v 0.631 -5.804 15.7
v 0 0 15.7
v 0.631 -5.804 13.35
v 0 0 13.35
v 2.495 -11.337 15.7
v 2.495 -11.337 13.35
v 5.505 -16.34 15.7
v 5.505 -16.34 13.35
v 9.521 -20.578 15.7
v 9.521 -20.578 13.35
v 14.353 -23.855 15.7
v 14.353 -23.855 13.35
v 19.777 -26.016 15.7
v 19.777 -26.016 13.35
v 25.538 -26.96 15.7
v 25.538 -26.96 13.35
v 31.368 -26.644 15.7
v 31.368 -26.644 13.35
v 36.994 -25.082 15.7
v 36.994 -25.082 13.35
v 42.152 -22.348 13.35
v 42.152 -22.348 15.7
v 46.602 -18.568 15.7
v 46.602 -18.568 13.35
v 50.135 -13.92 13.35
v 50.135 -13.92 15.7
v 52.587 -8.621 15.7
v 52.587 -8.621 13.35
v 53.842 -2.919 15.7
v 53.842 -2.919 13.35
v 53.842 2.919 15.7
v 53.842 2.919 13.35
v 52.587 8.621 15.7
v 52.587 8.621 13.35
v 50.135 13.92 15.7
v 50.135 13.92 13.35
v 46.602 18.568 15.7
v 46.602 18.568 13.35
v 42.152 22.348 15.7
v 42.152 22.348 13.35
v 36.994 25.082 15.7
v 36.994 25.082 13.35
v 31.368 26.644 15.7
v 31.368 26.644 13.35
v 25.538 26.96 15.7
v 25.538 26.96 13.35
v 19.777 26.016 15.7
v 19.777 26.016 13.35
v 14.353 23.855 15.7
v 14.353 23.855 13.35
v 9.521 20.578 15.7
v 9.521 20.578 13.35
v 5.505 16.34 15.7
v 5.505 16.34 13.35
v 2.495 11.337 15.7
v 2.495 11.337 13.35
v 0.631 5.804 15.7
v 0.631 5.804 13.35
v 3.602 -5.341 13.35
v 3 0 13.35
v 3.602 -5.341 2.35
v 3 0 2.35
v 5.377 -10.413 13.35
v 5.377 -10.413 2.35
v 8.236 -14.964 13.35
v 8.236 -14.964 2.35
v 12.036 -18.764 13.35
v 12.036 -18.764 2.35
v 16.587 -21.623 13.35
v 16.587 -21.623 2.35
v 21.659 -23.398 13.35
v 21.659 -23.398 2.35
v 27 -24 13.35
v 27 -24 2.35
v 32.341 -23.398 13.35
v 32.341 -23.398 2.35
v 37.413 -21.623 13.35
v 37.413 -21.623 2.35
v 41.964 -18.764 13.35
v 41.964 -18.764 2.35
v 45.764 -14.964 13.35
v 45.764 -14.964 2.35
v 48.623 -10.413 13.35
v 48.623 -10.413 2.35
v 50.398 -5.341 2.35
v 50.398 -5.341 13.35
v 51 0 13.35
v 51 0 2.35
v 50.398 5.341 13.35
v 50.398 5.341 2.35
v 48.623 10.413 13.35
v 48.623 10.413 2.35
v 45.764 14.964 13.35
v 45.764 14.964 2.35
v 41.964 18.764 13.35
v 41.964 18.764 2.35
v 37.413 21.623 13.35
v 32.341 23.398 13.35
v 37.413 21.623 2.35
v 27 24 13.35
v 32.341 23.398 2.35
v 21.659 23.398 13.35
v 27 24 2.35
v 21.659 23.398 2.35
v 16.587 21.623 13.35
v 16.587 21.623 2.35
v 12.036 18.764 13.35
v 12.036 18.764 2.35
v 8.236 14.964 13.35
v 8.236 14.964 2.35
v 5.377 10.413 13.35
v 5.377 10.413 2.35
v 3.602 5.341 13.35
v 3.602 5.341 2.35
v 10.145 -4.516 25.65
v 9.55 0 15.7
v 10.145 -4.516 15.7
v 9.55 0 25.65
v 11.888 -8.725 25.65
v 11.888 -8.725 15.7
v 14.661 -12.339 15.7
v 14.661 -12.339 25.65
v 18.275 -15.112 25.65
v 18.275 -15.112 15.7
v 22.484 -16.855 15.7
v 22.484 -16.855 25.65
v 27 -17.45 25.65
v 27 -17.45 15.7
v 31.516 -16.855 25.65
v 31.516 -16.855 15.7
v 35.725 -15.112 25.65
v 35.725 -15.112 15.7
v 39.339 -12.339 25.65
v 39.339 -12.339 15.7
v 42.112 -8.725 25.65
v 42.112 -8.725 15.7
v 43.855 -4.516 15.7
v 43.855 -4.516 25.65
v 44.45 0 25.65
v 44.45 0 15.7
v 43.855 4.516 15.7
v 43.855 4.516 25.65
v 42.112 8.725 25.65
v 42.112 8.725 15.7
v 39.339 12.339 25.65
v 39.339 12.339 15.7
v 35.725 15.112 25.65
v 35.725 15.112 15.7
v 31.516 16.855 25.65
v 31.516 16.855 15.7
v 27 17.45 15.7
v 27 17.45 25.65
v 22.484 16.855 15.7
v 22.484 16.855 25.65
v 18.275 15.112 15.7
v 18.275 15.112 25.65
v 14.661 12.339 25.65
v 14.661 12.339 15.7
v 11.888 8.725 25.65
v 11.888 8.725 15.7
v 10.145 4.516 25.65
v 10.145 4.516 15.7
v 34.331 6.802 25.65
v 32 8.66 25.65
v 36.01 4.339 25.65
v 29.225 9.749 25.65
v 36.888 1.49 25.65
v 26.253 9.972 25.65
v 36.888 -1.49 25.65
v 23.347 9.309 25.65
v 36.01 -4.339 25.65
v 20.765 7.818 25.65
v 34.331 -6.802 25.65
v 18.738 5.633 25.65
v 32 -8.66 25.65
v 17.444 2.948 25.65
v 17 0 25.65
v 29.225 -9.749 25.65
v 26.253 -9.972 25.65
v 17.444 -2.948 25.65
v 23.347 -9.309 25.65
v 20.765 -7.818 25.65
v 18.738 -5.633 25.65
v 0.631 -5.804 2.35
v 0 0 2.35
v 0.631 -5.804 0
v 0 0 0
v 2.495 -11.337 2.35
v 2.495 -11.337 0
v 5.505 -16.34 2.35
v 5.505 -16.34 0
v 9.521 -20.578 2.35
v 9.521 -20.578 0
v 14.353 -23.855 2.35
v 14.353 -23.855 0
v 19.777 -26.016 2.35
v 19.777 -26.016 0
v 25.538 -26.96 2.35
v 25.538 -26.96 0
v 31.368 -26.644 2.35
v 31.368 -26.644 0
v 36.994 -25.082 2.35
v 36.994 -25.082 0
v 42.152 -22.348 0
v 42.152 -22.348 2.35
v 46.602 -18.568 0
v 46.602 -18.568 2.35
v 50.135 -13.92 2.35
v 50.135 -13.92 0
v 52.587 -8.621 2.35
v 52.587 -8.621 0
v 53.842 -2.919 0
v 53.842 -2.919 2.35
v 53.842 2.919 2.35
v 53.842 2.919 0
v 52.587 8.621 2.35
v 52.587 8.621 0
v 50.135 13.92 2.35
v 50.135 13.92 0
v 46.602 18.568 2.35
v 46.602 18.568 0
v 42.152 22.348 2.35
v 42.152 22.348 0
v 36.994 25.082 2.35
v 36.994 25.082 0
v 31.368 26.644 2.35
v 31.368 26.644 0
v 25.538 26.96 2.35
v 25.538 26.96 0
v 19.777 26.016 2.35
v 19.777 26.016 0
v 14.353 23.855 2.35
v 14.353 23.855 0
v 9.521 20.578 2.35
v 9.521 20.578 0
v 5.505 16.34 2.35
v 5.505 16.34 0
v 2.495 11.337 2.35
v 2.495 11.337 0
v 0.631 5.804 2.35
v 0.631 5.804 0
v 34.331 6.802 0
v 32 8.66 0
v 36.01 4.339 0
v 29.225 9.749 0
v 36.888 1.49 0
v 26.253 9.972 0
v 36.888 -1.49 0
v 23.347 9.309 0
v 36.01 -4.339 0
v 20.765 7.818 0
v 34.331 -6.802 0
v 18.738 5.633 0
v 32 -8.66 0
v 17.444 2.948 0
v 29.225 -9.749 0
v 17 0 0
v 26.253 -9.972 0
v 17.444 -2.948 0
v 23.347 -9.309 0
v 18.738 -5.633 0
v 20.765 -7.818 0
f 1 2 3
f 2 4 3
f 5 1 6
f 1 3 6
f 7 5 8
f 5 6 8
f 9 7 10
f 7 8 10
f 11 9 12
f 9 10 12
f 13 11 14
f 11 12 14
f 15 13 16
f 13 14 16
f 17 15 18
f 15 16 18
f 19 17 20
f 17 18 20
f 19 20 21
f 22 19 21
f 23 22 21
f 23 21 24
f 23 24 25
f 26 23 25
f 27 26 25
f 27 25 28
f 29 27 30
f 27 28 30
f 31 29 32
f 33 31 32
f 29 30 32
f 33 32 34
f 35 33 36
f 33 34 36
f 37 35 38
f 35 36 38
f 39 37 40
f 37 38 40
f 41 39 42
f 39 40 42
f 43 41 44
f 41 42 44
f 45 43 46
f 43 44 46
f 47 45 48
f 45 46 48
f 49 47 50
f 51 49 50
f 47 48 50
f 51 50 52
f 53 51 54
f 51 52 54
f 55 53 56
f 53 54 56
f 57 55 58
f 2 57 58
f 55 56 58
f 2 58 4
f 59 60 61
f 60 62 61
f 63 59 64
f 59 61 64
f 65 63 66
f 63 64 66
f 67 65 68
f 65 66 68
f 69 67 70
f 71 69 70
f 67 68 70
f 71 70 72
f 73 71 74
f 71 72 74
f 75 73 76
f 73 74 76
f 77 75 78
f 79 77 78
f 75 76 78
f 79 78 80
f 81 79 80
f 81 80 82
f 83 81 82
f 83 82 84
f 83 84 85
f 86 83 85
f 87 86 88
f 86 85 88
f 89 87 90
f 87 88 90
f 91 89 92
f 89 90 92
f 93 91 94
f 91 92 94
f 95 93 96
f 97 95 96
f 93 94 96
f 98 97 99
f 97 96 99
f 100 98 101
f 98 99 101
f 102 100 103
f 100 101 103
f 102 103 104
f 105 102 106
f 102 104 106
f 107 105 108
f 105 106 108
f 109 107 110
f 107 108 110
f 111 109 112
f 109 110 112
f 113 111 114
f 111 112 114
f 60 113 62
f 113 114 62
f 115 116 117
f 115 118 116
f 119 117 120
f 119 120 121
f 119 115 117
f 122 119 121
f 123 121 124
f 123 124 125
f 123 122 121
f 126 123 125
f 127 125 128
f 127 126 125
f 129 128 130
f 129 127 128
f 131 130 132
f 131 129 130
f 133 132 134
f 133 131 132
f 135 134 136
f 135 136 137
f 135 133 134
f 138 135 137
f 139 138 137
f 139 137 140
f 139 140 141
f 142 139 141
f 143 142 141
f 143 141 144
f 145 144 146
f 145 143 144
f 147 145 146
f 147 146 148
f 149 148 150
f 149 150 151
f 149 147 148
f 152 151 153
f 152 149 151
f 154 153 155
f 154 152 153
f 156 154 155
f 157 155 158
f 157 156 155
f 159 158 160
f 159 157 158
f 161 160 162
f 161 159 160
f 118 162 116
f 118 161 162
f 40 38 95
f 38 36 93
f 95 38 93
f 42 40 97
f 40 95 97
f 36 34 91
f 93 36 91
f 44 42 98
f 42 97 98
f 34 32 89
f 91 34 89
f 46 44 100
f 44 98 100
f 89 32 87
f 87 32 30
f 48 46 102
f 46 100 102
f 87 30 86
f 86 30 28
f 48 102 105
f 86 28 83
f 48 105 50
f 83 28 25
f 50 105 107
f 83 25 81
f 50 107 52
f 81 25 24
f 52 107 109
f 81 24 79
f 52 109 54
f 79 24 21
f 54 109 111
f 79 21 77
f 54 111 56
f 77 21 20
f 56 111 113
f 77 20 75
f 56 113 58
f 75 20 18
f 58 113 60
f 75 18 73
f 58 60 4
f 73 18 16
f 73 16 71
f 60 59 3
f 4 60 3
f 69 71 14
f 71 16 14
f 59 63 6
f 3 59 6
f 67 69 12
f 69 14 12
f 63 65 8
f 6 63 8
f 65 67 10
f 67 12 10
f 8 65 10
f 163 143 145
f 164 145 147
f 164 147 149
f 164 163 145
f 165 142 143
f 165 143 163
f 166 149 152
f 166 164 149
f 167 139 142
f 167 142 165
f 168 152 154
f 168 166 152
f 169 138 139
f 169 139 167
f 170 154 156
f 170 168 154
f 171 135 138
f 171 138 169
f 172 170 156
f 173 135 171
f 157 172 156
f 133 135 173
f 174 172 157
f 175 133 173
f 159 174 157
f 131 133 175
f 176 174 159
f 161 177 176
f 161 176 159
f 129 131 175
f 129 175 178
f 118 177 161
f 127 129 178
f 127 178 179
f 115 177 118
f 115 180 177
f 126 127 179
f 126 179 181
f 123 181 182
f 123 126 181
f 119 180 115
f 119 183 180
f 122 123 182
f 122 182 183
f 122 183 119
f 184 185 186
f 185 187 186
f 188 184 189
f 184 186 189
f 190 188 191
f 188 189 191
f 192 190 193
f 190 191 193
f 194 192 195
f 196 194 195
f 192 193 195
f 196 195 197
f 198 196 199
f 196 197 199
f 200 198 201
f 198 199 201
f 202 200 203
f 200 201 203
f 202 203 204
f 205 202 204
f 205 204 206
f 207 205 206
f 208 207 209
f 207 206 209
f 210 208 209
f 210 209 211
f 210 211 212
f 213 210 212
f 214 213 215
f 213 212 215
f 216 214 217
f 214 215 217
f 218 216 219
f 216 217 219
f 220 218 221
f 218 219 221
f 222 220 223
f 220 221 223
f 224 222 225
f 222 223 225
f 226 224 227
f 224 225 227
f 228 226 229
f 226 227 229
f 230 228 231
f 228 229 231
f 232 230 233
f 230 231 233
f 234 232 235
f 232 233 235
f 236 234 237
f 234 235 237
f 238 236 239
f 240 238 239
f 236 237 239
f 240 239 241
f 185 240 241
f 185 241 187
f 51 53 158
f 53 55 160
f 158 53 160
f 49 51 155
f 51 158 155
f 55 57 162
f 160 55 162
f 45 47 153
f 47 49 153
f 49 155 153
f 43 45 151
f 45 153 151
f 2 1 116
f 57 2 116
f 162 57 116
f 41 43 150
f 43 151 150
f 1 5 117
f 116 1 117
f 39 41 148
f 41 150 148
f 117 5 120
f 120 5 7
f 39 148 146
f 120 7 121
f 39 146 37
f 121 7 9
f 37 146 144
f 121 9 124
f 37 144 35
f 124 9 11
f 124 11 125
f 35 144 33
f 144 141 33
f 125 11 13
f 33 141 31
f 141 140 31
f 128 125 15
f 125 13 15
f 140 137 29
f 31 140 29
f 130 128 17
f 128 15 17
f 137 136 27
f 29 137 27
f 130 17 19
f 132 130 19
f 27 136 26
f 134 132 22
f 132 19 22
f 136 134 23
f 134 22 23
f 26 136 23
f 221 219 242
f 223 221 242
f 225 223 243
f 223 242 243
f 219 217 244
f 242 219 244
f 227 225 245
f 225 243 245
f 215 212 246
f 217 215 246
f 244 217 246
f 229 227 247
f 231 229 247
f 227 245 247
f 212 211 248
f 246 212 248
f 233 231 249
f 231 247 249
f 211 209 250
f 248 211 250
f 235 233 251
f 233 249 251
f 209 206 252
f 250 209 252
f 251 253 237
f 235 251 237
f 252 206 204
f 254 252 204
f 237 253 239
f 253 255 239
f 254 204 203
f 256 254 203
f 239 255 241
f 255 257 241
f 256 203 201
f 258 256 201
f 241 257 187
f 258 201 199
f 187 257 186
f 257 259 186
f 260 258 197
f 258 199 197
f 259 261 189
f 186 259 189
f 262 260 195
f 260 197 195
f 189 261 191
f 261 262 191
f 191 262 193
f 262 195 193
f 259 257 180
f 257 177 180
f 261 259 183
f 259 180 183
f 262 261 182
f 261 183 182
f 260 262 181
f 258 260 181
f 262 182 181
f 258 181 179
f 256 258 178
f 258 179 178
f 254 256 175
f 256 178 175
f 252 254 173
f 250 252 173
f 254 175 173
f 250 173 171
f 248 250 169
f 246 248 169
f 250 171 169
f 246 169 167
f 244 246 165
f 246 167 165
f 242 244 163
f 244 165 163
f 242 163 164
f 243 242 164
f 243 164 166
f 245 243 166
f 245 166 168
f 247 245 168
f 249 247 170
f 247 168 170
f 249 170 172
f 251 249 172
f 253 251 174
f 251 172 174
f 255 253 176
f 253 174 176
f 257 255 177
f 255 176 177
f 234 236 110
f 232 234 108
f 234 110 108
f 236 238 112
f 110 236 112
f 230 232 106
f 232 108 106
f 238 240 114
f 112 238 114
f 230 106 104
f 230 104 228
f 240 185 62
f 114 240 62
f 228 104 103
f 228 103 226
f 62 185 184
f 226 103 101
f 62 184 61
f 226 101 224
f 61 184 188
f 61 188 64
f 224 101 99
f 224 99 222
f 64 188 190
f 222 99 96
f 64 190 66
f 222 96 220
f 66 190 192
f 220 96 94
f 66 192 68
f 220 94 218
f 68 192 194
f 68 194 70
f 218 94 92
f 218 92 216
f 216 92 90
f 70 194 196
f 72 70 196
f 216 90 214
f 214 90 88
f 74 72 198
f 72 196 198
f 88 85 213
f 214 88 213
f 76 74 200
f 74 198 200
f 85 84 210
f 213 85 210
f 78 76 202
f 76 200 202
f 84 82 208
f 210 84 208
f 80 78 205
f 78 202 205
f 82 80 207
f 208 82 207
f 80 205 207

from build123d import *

# Parameters (mm, degrees)
F0_W = 7.45
F0_H = 9.95


# Not quite as in the source:
# - a feature names something its author has since deleted; it is built from what else it names


with BuildPart() as f1:
    # F0 (on Front) → F1 (revolve)
    with BuildSketch(Plane.XZ):
        Polygon((0, 2.35), (0, 0), (17, 0), (17, 15.7), (9.55, 15.7), (0, 15.7), (0, 13.35), (3, 13.35), (3, 2.35), align=None)
        with Locations((13.275, 20.675)):
            Rectangle(F0_W, F0_H)
    revolve(axis=Axis((27, 0, 7.85), (0, 0, 1)))


solid = f1.part
